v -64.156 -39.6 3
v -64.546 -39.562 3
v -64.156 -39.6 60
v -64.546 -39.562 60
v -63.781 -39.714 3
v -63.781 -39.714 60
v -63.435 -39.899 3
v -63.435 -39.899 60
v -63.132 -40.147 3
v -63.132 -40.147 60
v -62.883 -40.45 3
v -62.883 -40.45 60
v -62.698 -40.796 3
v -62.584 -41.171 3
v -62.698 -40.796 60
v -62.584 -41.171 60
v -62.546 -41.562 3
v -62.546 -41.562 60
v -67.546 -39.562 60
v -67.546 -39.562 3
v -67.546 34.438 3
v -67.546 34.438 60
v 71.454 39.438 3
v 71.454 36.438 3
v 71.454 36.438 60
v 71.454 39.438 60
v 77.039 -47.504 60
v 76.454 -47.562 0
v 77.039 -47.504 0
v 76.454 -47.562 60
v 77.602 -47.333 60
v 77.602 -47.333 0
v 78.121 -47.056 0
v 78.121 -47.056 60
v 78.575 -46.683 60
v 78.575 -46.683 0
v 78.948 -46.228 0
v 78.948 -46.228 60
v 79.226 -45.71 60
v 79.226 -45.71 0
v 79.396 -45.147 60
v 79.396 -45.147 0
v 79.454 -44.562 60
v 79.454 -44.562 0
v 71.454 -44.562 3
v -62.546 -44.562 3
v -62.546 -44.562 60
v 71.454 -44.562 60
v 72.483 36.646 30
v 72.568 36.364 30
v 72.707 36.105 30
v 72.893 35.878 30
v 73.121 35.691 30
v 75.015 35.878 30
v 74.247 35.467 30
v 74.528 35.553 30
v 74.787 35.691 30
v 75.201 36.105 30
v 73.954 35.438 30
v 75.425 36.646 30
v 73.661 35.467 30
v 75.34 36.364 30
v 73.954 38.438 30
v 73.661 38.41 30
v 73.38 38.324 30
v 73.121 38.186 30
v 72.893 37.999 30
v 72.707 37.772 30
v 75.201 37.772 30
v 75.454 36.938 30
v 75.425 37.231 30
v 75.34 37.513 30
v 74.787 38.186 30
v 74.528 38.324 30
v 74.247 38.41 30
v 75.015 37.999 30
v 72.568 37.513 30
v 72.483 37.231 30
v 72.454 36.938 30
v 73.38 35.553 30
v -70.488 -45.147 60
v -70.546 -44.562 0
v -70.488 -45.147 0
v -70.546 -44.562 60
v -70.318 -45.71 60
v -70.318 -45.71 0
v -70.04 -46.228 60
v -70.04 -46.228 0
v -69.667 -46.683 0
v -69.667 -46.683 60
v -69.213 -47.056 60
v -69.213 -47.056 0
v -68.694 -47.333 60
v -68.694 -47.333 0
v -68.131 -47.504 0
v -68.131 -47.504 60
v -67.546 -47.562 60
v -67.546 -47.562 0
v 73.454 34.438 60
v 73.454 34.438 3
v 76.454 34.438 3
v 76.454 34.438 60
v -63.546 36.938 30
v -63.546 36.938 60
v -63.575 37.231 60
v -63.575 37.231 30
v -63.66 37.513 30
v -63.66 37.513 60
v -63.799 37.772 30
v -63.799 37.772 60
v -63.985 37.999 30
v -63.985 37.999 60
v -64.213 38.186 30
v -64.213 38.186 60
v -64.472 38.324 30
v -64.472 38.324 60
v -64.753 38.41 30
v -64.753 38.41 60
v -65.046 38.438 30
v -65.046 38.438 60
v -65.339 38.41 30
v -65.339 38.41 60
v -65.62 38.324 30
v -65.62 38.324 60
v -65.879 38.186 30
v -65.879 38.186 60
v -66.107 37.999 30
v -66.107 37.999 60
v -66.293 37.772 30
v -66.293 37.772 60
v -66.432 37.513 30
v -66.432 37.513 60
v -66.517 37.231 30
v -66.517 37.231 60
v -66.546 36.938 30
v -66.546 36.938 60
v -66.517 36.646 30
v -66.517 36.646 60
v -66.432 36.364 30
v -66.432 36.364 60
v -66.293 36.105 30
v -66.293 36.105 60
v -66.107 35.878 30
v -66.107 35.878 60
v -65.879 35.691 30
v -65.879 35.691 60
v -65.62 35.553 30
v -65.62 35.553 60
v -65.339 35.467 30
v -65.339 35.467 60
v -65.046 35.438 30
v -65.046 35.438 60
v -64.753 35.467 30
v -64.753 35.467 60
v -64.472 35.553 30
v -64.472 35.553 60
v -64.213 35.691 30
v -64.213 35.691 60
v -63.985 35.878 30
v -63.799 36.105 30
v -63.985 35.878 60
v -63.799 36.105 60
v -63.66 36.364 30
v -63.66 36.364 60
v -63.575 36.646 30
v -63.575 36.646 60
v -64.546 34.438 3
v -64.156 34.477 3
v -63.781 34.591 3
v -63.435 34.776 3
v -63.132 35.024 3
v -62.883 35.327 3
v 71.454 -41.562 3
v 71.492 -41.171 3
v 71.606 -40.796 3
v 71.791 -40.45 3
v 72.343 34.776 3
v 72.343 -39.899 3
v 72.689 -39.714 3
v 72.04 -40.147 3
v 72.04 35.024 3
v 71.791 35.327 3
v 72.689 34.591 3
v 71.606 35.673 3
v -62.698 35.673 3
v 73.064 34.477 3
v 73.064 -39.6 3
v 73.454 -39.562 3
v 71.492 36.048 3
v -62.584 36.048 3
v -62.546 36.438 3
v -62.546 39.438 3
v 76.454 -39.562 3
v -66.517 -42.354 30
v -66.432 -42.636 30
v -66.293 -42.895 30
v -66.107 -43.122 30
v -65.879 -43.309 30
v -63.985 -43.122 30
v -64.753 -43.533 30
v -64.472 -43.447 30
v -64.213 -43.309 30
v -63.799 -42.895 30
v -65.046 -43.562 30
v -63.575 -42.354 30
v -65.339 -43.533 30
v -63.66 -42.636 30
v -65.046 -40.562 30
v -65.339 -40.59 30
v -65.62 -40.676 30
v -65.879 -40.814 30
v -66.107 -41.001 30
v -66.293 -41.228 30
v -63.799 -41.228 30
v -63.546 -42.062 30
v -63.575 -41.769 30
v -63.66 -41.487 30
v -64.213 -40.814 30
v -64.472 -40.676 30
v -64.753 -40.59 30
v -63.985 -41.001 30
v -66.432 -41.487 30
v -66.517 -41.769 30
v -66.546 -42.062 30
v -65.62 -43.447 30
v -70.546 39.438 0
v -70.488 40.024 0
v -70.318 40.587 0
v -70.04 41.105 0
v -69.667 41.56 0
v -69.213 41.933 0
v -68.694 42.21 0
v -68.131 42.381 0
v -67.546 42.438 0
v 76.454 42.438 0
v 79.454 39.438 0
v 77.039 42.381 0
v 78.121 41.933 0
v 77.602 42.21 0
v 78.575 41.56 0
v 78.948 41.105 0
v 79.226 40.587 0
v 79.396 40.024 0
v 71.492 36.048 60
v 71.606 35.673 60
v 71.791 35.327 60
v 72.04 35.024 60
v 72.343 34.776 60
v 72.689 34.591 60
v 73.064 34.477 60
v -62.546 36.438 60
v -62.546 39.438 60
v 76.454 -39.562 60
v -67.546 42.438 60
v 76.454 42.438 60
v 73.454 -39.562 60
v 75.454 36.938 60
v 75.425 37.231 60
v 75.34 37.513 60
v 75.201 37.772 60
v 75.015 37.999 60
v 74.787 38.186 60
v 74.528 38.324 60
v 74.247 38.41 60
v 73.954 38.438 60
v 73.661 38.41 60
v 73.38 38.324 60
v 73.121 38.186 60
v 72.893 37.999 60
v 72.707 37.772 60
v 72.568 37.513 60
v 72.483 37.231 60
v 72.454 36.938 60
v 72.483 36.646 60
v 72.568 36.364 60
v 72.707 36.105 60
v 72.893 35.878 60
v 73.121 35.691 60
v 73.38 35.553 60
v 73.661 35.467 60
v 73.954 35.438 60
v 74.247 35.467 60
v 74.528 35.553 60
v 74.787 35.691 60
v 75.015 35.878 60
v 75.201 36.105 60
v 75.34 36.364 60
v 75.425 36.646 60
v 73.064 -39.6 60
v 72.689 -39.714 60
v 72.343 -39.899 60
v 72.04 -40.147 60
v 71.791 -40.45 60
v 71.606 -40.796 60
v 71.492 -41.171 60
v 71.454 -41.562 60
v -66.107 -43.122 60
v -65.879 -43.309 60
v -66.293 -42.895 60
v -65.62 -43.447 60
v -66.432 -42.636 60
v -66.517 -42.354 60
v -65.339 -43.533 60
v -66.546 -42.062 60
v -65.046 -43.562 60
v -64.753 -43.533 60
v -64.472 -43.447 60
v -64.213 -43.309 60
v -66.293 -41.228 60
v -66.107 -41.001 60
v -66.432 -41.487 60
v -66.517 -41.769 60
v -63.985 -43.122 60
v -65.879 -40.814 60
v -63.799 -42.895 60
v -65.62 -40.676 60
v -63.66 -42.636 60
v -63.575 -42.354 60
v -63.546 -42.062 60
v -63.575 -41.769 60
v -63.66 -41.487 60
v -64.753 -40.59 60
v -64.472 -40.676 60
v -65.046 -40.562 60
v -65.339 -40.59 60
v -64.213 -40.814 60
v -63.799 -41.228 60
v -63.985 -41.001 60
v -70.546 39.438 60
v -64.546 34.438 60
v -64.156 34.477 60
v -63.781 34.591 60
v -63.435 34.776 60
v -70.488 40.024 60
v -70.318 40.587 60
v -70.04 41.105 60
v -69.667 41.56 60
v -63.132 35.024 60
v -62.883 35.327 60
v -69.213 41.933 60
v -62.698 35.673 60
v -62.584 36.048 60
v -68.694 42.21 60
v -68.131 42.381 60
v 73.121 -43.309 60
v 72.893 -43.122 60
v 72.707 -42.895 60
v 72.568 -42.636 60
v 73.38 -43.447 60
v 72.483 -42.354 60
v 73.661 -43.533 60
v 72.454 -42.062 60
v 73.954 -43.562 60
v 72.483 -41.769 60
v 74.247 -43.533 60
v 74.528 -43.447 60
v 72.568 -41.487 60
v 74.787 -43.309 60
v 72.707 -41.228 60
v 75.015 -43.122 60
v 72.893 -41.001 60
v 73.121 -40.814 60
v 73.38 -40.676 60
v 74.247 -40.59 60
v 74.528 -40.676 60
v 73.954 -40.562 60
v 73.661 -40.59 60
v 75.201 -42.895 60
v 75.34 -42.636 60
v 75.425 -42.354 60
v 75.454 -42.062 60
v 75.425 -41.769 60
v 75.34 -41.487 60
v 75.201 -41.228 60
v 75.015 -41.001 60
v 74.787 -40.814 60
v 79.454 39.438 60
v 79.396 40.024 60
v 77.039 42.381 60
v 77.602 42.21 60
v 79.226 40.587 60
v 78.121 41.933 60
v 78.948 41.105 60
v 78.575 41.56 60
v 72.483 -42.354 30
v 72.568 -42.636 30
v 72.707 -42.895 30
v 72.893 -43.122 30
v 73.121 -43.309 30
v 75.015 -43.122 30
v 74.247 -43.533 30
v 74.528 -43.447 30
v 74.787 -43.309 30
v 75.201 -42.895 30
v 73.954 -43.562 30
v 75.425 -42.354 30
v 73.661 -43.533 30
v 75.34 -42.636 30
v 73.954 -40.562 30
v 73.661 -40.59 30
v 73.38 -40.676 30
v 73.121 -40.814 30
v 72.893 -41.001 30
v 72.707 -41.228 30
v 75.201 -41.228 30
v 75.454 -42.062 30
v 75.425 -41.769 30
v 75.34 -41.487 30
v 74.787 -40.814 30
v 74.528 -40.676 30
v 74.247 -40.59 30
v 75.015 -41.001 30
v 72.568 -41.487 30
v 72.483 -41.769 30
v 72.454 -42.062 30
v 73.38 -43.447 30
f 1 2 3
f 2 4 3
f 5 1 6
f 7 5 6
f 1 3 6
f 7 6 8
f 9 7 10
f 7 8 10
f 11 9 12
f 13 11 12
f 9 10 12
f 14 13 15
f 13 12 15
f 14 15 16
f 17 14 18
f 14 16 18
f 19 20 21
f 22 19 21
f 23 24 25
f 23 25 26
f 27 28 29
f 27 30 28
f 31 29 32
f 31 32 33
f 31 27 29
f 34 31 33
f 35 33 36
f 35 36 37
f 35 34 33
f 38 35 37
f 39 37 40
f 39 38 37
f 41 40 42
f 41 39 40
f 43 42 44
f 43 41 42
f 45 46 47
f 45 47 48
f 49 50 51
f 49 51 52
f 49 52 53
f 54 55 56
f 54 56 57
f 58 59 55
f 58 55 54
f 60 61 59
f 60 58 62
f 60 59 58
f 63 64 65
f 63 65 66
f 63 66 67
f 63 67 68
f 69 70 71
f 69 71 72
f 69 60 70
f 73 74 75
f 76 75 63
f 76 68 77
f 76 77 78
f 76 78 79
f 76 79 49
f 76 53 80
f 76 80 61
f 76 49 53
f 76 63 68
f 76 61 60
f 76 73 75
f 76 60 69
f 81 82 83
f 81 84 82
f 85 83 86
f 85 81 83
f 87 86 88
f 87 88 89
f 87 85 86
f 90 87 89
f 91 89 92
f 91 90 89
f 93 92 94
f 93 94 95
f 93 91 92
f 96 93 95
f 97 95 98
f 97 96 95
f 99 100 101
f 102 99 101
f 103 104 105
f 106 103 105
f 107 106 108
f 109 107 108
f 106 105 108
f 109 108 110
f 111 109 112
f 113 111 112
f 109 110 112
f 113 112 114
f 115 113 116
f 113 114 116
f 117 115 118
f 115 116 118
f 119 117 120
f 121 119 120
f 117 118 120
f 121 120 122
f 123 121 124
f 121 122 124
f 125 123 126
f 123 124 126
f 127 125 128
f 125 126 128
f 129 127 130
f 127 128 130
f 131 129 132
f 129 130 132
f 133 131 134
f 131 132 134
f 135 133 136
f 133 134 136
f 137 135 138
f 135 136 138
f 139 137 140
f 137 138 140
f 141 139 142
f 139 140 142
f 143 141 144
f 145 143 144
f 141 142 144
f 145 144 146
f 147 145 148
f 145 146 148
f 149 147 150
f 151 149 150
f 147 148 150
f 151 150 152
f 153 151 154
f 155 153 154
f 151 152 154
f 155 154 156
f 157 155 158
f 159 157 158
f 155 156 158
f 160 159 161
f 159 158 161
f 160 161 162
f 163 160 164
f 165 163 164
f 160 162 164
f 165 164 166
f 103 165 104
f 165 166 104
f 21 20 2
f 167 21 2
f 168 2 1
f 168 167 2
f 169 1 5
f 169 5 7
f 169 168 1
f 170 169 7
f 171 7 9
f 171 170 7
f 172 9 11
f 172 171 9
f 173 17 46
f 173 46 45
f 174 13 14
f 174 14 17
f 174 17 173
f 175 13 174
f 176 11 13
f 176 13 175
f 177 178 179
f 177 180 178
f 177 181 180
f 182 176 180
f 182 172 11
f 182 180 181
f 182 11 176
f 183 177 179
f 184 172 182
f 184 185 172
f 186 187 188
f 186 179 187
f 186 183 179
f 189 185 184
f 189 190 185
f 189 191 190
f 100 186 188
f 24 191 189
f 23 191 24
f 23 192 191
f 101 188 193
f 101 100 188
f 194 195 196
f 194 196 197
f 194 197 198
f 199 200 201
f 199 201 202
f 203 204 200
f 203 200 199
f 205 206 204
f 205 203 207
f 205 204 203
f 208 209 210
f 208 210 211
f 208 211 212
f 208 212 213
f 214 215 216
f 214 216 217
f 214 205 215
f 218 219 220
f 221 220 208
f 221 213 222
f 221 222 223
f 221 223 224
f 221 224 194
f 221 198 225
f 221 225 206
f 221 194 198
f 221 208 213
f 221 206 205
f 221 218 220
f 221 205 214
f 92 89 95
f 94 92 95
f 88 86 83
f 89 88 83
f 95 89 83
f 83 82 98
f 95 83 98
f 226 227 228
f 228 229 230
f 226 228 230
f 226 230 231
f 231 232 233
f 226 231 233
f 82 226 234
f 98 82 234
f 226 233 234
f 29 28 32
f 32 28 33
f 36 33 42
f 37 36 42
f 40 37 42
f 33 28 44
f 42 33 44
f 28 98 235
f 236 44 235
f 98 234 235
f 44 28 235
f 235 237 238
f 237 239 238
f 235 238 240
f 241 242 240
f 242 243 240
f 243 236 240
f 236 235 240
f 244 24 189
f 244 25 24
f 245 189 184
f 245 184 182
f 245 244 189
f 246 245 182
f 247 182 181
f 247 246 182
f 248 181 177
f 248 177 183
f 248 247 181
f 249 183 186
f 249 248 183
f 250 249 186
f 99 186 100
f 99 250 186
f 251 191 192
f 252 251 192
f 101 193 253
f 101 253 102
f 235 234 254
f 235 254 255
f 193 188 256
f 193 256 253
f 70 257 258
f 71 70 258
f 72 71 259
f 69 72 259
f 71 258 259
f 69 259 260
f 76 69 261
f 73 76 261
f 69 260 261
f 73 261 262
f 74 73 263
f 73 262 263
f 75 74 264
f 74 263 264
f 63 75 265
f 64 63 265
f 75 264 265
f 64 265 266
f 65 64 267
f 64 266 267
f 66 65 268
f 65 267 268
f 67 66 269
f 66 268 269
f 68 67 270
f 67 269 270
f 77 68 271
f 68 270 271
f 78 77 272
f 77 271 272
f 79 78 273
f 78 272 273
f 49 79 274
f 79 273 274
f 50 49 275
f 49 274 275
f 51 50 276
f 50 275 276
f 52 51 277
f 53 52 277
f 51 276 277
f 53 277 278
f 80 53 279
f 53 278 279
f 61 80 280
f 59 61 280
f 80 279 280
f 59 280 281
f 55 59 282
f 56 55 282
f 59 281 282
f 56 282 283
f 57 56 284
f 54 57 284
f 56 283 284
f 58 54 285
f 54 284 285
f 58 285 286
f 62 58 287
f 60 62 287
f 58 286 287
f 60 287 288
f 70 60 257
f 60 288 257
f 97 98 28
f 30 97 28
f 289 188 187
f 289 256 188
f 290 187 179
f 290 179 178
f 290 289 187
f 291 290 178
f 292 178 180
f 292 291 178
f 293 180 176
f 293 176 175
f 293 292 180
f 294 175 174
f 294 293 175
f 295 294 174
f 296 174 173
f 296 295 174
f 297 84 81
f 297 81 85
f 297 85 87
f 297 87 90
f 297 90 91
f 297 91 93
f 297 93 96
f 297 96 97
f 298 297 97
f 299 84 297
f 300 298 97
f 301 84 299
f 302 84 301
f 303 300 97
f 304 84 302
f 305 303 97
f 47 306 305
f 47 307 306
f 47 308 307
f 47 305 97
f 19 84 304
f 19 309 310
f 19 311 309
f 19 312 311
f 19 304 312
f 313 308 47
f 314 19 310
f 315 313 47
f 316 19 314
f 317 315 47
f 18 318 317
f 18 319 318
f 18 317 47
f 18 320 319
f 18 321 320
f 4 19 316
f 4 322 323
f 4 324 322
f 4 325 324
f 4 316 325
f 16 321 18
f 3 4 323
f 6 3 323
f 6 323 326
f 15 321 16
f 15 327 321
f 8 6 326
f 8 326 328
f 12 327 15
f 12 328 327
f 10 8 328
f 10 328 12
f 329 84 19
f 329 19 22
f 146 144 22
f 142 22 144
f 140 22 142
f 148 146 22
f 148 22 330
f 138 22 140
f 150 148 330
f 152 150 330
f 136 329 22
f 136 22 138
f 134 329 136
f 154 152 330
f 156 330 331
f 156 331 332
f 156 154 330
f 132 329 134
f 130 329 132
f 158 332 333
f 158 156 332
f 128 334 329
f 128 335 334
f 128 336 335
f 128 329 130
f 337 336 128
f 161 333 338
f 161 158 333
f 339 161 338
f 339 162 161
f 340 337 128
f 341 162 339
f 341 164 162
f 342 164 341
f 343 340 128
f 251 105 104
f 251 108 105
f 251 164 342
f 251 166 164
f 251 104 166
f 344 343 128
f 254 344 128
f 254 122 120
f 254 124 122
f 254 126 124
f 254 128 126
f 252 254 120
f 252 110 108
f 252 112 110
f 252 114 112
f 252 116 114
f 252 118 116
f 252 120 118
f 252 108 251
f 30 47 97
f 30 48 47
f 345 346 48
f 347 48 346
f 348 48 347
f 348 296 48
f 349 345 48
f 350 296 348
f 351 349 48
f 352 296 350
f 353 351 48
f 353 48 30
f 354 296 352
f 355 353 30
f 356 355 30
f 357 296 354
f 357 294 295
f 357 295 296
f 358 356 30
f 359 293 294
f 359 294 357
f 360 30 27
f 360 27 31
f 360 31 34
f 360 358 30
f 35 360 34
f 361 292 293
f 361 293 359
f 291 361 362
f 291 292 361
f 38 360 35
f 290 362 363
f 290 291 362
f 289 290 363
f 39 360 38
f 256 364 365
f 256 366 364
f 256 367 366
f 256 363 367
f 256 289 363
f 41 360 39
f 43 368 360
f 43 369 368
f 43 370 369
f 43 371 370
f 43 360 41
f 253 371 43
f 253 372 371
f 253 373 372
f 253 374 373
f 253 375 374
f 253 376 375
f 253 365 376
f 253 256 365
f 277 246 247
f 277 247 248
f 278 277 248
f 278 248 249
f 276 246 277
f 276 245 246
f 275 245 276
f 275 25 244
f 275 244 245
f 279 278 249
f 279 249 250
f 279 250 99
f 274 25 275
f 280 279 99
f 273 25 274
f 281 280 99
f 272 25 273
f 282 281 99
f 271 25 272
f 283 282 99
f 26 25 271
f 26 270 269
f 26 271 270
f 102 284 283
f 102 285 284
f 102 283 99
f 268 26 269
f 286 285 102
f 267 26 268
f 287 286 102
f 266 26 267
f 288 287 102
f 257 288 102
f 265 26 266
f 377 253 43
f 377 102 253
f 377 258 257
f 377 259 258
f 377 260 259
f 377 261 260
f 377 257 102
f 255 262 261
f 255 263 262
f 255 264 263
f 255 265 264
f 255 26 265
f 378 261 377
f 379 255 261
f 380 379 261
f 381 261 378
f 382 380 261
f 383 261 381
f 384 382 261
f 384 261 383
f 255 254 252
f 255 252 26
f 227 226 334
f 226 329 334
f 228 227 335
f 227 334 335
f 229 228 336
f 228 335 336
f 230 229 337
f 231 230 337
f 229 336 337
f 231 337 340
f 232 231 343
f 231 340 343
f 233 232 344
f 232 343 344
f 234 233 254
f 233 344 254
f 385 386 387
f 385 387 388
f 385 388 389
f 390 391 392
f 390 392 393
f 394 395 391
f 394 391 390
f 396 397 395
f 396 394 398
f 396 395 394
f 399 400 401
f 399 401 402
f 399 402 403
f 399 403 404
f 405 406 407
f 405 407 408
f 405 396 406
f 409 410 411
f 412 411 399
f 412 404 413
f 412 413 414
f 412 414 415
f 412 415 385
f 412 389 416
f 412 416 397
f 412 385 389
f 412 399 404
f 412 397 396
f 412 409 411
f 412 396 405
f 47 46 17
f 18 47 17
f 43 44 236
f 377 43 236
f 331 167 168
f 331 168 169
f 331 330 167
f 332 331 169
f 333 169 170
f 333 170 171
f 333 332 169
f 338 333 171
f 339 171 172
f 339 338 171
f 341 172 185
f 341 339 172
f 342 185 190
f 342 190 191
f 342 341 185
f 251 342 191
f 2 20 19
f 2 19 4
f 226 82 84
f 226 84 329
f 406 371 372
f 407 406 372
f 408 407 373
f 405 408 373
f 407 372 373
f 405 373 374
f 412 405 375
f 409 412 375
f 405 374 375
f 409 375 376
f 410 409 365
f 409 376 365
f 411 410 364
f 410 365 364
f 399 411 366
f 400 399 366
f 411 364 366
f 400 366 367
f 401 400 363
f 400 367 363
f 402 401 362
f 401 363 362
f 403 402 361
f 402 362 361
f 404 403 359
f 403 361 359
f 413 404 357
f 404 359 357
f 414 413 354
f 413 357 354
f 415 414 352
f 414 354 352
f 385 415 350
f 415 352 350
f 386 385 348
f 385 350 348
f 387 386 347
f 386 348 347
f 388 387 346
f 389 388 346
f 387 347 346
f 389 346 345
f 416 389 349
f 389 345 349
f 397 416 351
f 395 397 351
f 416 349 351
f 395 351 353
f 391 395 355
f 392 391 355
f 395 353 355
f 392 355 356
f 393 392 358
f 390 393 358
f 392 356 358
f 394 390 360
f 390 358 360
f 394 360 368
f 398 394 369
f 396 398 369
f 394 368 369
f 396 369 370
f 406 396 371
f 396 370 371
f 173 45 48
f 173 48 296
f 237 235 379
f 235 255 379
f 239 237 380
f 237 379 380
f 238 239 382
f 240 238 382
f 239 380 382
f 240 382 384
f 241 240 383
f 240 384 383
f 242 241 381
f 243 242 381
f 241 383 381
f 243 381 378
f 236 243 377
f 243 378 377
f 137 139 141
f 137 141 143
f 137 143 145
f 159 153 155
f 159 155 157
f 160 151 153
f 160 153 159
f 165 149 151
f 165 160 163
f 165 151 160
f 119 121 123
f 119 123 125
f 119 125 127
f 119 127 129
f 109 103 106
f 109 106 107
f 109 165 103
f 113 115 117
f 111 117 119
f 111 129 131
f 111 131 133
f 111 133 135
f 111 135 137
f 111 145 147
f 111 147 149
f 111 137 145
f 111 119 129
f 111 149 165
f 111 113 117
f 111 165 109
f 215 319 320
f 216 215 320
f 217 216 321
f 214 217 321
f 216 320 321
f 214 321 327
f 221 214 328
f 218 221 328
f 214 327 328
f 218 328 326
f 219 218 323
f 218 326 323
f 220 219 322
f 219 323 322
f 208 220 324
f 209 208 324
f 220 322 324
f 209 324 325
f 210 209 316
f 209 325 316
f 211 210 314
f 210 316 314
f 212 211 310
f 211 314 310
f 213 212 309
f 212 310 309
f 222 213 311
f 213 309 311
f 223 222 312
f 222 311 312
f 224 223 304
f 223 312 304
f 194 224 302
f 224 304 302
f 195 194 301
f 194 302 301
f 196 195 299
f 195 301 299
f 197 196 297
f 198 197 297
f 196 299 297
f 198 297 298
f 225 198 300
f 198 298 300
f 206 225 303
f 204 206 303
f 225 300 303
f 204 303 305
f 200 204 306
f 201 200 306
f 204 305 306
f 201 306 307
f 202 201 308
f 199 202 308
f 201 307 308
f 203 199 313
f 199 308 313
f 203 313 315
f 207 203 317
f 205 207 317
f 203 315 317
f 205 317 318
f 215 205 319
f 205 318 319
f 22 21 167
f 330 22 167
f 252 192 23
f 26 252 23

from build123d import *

# Parameters (mm, degrees)
F0_W     = 144
F0_H     = 84
F1_DEPTH = 3
F0_W_2   = 150
F0_H_2   = 90
F2_DEPTH = 60
F3_R     = 3
F4_W     = 5
F4_H     = 5
F5_DEPTH = 57
F6_R     = 1.5
F7_DEPTH = 30
F8_R     = 2


with BuildPart() as f1:
    # F0 (on Top) → F1 (new body)
    with BuildSketch(Plane.XY):
        with Locations((4.453997, -2.561509)):
            Rectangle(F0_W, F0_H)
    extrude(amount=F1_DEPTH)

    # F0 (on Top) → F2 (join)
    with BuildSketch(Plane.XY):
        with Locations((4.453997, -2.561509)):
            Rectangle(F0_W_2, F0_H_2)
        with Locations((4.453997, -2.561509)):
            Rectangle(F0_W, F0_H, mode=Mode.SUBTRACT)
    extrude(amount=F2_DEPTH)

    # F3
    f3_edges = [f1.edges().sort_by_distance(p)[0] for p in [
        (-70.546003, 42.438491, 30),
        (-70.546003, -47.561509, 30),
        (79.453997, -47.561509, 30),
        (79.453997, 42.438491, 30),
    ]]
    fillet(f3_edges, radius=F3_R)

    # F4 (on face) → F5 (join)
    with BuildSketch(Plane.XY.offset(3)):
        with Locations((-65.046003, 36.938491)):
            Rectangle(F4_W, F4_H)
        with Locations((-65.046003, -42.061509)):
            Rectangle(F4_W, F4_H)
        with Locations((73.953997, 36.938491)):
            Rectangle(F4_W, F4_H)
        with Locations((73.953997, -42.061509)):
            Rectangle(F4_W, F4_H)
    extrude(amount=F5_DEPTH)

    # F6 (on face) → F7 (cut)
    with BuildSketch(Plane.XY.offset(60)):
        with Locations((-65.046003, 36.938491)):
            Circle(F6_R)
        with Locations((-65.046003, -42.061509)):
            Circle(F6_R)
        with Locations((73.953997, -42.061509)):
            Circle(F6_R)
        with Locations((73.953997, 36.938491)):
            Circle(F6_R)
    extrude(amount=-F7_DEPTH, mode=Mode.SUBTRACT)

    # F8
    f8_edges = [f1.edges().sort_by_distance(p)[0] for p in [
        (-62.546003, 34.438491, 31.5),
        (71.453997, 34.438491, 31.5),
        (71.453997, -39.561509, 31.5),
        (-62.546003, -39.561509, 31.5),
    ]]
    fillet(f8_edges, radius=F8_R)


solid = f1.part
